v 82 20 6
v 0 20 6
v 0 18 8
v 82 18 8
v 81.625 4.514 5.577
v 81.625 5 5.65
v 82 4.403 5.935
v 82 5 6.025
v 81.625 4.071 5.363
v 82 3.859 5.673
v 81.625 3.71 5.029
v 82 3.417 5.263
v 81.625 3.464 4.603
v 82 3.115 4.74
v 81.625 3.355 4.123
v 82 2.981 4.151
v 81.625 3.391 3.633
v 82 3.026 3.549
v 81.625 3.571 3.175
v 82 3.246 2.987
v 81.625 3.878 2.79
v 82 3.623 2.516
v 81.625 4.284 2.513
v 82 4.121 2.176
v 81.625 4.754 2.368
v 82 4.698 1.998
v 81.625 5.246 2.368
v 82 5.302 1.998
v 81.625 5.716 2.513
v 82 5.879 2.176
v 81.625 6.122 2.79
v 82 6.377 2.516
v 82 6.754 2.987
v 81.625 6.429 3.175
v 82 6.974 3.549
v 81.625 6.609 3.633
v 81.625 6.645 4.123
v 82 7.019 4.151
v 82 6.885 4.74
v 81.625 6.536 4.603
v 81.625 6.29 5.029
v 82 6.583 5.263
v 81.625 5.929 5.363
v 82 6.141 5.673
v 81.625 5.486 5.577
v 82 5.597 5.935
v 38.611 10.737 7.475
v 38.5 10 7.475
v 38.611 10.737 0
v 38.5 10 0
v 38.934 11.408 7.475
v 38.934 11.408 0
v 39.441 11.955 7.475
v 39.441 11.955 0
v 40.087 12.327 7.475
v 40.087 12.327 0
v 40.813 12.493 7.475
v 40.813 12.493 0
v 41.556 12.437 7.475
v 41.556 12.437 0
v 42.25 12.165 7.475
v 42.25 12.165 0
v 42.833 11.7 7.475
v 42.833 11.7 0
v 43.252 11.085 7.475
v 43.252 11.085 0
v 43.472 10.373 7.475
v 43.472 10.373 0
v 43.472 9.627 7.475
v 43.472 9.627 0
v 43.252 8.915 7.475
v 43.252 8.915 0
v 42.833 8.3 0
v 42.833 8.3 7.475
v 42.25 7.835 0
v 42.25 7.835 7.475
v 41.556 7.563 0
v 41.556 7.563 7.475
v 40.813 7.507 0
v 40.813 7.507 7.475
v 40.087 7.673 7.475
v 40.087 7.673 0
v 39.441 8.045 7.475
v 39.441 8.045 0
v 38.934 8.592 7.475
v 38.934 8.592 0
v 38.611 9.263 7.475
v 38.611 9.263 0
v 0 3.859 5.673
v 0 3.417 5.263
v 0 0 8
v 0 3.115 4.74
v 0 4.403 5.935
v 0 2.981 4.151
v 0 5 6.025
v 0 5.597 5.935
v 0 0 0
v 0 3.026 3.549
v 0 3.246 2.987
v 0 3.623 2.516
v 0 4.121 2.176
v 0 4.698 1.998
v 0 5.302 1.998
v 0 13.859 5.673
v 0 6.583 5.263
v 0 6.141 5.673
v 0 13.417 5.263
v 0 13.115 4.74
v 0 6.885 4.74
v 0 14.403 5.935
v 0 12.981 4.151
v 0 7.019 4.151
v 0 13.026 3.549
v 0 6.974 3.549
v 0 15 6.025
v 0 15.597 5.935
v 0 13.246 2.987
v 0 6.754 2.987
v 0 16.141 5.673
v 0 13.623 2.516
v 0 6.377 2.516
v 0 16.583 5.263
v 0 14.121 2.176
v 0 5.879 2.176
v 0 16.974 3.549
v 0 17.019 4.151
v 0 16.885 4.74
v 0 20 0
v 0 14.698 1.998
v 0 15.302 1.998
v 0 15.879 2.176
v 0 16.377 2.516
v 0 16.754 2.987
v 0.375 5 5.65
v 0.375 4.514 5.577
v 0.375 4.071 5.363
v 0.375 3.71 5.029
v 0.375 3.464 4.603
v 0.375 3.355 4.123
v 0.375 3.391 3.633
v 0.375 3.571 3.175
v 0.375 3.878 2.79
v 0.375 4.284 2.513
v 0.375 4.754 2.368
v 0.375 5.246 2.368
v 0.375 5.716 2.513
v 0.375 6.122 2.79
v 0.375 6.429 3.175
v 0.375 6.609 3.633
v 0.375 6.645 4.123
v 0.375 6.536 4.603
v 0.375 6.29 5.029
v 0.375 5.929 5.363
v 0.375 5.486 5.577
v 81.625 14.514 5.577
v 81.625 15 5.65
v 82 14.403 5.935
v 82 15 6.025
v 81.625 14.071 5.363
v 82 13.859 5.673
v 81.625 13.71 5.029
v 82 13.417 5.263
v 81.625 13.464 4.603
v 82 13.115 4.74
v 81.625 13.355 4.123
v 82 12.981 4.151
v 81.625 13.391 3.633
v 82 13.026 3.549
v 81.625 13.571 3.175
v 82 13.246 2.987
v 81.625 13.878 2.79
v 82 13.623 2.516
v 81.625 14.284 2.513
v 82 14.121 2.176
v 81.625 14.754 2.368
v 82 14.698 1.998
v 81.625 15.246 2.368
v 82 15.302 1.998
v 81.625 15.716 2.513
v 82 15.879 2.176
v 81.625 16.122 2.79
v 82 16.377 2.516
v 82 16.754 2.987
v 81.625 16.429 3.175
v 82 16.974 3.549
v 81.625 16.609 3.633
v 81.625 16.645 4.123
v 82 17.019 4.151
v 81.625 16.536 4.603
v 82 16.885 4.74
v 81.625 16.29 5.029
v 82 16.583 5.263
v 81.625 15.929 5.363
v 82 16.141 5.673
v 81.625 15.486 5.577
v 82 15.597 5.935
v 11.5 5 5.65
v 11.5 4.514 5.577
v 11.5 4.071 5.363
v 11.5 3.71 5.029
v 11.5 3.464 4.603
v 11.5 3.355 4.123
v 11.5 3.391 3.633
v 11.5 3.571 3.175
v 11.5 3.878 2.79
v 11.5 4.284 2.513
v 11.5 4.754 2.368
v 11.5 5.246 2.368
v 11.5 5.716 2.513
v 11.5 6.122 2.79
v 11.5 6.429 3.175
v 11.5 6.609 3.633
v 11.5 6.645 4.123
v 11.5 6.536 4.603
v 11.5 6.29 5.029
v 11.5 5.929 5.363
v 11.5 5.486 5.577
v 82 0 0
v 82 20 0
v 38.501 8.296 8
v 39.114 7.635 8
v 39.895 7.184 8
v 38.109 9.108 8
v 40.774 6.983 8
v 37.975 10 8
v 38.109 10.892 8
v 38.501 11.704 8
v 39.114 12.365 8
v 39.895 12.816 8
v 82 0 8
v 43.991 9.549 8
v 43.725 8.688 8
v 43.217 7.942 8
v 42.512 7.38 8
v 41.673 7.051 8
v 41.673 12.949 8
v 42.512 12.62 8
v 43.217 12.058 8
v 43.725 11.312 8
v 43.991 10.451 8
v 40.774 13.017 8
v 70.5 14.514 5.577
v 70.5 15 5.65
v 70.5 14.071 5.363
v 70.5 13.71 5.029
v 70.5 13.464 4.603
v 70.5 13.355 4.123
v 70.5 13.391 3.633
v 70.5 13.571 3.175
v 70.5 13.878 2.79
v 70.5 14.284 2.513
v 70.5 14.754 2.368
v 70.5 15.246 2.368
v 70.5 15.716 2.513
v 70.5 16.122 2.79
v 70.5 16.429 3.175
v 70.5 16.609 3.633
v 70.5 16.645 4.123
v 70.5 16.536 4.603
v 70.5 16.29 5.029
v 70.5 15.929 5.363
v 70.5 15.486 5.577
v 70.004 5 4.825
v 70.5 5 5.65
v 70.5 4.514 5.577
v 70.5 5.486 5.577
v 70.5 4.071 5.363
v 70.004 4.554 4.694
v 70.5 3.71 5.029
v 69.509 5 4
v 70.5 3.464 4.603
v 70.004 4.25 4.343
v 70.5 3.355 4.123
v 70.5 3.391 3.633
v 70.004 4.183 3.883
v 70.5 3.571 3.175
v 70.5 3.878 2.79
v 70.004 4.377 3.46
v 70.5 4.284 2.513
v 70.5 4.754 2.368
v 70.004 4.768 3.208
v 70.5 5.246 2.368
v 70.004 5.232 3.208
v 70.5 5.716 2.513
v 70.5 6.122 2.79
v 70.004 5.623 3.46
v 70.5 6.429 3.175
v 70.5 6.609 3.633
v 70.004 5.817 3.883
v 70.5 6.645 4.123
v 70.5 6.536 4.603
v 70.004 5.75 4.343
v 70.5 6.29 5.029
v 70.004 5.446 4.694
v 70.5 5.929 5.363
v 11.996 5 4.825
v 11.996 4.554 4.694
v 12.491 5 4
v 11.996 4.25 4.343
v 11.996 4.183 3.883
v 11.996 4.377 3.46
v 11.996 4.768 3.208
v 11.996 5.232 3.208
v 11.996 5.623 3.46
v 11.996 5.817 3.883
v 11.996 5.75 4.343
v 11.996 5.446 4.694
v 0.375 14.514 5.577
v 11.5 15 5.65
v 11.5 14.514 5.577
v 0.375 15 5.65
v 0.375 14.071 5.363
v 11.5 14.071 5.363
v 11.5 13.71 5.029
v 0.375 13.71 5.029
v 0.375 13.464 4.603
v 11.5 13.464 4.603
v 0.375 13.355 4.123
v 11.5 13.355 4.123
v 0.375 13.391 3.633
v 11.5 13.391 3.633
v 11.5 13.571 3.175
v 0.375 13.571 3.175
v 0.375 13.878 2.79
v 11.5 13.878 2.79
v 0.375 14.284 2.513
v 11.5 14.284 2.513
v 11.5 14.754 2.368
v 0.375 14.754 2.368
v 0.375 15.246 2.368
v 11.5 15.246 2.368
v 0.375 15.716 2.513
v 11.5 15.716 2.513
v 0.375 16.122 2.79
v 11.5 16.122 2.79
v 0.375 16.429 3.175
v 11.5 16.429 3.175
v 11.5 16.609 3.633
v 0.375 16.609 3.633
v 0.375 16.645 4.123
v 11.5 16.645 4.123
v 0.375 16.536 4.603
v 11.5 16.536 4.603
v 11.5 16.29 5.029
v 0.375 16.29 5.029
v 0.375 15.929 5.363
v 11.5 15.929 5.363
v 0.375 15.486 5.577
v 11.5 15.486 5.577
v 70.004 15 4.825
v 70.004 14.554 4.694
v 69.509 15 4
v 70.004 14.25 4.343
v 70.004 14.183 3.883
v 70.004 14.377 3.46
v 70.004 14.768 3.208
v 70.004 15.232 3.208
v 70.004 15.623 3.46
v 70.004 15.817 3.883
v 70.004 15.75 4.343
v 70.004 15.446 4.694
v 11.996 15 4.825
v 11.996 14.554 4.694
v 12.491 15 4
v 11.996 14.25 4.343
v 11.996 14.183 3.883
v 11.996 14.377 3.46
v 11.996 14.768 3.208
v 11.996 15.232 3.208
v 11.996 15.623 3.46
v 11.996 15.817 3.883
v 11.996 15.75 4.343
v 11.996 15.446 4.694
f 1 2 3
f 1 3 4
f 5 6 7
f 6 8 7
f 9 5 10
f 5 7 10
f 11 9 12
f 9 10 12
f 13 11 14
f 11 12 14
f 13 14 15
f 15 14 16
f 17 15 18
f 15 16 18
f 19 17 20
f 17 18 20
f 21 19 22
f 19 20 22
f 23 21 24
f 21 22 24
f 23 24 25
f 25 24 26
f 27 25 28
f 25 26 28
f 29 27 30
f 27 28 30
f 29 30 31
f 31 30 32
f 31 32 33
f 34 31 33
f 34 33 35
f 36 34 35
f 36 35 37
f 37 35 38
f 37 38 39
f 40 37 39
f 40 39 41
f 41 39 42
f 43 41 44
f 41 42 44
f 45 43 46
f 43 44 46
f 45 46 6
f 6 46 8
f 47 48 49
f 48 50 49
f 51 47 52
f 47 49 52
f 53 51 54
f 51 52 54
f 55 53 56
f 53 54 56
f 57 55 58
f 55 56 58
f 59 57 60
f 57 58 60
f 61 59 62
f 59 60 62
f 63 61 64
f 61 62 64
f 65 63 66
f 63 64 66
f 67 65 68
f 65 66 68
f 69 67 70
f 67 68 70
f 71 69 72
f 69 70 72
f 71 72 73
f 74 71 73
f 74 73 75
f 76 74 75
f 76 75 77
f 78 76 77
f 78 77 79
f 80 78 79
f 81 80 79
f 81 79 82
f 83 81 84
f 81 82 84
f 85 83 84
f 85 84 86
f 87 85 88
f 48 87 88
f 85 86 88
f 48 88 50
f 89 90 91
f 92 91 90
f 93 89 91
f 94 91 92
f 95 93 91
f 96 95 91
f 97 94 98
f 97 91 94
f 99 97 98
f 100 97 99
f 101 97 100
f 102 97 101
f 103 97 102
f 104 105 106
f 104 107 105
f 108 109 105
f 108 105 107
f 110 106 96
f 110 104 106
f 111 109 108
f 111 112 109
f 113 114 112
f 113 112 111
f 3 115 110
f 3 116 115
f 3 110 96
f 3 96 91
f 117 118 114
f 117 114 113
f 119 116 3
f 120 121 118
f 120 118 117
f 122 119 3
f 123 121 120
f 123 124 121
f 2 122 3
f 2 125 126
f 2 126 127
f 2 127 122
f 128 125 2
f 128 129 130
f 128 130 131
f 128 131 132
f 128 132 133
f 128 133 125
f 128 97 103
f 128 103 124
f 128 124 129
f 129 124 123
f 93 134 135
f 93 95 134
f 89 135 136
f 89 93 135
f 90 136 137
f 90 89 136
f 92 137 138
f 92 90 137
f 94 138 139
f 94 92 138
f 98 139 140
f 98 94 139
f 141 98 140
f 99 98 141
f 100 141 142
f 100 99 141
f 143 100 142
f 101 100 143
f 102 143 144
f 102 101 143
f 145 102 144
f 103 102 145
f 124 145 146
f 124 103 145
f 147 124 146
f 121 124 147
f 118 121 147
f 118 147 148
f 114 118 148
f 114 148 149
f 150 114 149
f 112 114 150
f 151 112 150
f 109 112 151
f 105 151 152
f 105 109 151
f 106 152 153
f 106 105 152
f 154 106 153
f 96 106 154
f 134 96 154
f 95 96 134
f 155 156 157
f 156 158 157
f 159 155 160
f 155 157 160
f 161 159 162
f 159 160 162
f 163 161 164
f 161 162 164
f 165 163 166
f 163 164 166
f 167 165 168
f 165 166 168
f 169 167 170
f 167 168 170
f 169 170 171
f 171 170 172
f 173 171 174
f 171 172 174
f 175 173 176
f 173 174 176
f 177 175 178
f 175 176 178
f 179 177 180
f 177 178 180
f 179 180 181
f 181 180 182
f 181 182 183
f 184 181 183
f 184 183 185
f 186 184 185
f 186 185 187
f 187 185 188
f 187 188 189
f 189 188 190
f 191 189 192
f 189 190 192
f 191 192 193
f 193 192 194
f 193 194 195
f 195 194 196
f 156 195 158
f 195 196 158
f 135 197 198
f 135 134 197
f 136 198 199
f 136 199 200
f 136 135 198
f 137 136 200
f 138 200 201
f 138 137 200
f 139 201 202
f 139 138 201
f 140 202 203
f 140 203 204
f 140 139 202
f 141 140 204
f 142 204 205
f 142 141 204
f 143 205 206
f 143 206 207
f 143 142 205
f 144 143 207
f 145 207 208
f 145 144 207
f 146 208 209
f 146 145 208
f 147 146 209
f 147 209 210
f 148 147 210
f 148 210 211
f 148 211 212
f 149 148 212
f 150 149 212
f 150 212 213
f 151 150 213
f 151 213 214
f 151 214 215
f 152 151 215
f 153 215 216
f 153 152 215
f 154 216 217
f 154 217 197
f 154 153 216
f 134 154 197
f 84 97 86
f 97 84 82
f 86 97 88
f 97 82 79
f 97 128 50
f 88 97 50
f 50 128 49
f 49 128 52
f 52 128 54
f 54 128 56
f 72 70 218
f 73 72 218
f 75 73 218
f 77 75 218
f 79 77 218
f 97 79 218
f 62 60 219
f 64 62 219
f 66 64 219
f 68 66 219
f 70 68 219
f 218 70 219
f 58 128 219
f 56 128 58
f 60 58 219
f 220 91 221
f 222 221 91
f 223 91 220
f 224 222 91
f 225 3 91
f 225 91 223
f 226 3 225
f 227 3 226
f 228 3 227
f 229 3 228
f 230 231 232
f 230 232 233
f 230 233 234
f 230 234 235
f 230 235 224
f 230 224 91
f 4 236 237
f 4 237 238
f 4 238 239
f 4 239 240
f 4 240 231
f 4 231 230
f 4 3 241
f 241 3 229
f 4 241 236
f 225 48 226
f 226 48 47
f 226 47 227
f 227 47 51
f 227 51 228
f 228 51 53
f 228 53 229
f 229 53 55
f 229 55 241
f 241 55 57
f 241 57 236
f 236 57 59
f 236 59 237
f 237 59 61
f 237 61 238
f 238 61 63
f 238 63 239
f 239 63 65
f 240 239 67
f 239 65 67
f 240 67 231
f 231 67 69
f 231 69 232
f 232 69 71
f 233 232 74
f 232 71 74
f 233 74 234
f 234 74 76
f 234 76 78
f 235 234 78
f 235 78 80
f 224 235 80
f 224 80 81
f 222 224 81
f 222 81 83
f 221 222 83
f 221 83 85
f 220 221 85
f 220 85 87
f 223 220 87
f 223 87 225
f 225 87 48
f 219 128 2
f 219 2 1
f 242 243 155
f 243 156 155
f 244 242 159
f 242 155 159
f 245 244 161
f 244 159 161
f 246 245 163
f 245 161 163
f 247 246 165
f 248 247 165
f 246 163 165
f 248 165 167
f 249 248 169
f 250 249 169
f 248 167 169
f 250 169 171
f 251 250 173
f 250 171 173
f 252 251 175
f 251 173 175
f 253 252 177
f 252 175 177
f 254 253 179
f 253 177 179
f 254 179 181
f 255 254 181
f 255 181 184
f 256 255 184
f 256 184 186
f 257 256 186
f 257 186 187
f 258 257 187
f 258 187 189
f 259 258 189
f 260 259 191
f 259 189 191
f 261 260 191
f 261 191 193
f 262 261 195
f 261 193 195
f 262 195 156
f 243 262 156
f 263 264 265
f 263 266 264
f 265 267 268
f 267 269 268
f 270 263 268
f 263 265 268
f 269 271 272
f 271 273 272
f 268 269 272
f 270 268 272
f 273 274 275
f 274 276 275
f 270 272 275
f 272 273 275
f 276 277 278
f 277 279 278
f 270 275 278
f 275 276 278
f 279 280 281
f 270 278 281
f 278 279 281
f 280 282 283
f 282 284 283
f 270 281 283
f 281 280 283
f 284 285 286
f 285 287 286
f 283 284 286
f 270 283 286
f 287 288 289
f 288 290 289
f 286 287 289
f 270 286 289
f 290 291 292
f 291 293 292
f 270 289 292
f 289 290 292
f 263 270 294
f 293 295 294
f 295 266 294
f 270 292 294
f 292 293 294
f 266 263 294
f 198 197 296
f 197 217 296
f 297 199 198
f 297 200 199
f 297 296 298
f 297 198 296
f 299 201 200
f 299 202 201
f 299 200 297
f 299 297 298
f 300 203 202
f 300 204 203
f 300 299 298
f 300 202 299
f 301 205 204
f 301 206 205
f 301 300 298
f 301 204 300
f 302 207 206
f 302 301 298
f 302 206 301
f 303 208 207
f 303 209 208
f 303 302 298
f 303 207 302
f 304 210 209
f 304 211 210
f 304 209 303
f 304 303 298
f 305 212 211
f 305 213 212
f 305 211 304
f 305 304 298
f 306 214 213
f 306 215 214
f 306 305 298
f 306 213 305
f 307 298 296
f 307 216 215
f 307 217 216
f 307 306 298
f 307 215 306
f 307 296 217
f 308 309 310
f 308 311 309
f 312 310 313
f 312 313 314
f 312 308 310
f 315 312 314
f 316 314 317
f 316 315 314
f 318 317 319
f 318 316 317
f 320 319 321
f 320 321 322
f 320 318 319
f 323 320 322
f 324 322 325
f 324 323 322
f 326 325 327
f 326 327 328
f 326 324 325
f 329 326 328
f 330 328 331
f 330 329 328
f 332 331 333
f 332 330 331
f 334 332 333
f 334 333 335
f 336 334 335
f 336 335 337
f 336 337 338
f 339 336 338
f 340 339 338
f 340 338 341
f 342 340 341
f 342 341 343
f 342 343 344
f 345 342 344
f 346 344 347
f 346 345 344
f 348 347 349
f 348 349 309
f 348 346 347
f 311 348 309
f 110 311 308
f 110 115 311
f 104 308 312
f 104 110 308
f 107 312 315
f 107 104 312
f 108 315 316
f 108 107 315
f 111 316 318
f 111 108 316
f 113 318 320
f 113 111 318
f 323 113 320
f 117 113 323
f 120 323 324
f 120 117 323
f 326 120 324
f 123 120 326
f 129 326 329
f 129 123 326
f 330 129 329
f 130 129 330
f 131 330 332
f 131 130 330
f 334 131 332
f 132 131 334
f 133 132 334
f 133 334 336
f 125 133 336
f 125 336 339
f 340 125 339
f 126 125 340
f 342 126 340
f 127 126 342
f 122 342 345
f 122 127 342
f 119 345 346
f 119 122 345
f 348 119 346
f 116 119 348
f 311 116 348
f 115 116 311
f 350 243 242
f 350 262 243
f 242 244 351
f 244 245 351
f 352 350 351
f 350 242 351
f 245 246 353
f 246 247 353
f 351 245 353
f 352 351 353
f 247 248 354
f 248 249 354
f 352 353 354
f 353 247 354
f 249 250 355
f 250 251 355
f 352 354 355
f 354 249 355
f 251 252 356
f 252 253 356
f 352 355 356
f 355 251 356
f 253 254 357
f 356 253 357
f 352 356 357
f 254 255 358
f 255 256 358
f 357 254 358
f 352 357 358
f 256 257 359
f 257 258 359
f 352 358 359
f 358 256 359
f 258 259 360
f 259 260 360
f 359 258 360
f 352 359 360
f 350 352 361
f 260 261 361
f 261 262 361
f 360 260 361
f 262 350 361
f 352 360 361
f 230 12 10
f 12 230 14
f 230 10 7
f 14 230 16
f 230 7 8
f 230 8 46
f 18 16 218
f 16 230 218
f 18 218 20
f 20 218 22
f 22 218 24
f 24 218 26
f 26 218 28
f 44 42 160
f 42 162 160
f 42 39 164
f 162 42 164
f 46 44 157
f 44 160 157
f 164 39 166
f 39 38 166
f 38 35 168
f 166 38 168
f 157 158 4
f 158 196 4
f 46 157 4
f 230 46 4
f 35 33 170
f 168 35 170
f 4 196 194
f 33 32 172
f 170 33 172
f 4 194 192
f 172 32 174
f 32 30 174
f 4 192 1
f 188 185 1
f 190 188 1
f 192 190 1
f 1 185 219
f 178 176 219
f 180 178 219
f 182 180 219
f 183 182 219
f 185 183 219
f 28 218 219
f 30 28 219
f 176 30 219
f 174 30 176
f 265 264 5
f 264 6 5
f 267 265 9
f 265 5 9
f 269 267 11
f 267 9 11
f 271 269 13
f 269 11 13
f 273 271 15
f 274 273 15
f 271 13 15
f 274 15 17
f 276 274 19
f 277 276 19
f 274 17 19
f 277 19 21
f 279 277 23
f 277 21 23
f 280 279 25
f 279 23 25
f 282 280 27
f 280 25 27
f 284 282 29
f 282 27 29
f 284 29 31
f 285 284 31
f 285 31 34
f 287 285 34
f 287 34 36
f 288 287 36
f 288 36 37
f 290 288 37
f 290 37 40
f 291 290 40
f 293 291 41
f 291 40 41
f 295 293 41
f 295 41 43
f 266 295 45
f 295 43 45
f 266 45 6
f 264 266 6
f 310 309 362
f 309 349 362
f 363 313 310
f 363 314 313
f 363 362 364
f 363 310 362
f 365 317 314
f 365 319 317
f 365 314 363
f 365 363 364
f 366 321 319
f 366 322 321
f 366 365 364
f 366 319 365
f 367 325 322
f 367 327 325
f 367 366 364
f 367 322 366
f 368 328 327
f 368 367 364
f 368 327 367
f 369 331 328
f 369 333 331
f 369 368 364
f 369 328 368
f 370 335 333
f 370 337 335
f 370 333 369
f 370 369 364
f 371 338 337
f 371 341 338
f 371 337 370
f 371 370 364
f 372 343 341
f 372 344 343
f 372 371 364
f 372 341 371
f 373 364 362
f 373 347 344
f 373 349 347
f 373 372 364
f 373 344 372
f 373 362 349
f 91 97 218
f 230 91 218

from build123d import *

# Parameters (mm, degrees)
SKETCH_1_W                   = 82
SKETCH_1_H                   = 20
EXTRUDE_1_DEPTH              = 8
HOLE_WIZARD_M6_1_D           = 5
HOLE_WIZARD_M6_1_CSINK_D     = 6.05
HOLE_WIZARD_M6_1_CSINK_ANGLE = 90
HOLE_WIZARD_M4_1_AT_2_COUNT  = 2
HOLE_WIZARD_M4_1_AT_2_PITCH  = 10
CHAMFER_1_SIZE               = 2


with BuildPart() as part:
    # 스케치1 → 보스-돌출1 (new body)
    with BuildSketch(Plane.XY):
        with Locations((41, 10)):
            Rectangle(SKETCH_1_W, SKETCH_1_H)
    extrude(amount=EXTRUDE_1_DEPTH)

    # M6 나사 구멍1 (through all)
    with Locations(Plane.XY.offset(8)):
        with Locations((41, 10)):
            CounterSinkHole(HOLE_WIZARD_M6_1_D / 2, HOLE_WIZARD_M6_1_CSINK_D / 2, counter_sink_angle=HOLE_WIZARD_M6_1_CSINK_ANGLE)

    # 스케치5 → M4 나사 구멍1 (revolve, cut)
    with BuildSketch(Plane(origin=(0, 15, 4), x_dir=(0, 0, 1), z_dir=(0, 1, 0))):
        Polygon((0, 0), (0, 12.491420021), (1.65, 11.5), (1.65, 0.375), (2.025, 0), align=None)
    hole_wizard_m4_1 = revolve(axis=Axis((-6.35, 15, 4), (1, 0, 0)), mode=Mode.SUBTRACT)

    # M4 나사 구멍1 at 2: M4 나사 구멍1 ×2
    with Locations(*[(0, -i * HOLE_WIZARD_M4_1_AT_2_PITCH, 0) for i in range(1, HOLE_WIZARD_M4_1_AT_2_COUNT)]):
        add(hole_wizard_m4_1, mode=Mode.SUBTRACT)

    # 대칭 복사1: M4 나사 구멍1 across plane
    add(hole_wizard_m4_1.mirror(Plane.ZY.offset(-41)), mode=Mode.SUBTRACT)

    # 대칭 복사1 copy 1 sketch → 대칭 복사1 copy 1 (revolve, cut)
    with BuildSketch(Plane(origin=(82, 5, 4), x_dir=(0, 0, 1), z_dir=(0, 1, 0))):
        Polygon((0, 0), (0, -12.491420021), (1.65, -11.5), (1.65, -0.375), (2.025, 0), align=None)
    revolve(axis=Axis((88.35, 5, 4), (1, 0, 0)), mode=Mode.SUBTRACT)

    # 모따기1
    chamfer_1_edges = [part.edges().sort_by_distance(p)[0] for p in [
        (41, 20, 8),
    ]]
    chamfer(chamfer_1_edges, length=CHAMFER_1_SIZE)


solid = part.part
